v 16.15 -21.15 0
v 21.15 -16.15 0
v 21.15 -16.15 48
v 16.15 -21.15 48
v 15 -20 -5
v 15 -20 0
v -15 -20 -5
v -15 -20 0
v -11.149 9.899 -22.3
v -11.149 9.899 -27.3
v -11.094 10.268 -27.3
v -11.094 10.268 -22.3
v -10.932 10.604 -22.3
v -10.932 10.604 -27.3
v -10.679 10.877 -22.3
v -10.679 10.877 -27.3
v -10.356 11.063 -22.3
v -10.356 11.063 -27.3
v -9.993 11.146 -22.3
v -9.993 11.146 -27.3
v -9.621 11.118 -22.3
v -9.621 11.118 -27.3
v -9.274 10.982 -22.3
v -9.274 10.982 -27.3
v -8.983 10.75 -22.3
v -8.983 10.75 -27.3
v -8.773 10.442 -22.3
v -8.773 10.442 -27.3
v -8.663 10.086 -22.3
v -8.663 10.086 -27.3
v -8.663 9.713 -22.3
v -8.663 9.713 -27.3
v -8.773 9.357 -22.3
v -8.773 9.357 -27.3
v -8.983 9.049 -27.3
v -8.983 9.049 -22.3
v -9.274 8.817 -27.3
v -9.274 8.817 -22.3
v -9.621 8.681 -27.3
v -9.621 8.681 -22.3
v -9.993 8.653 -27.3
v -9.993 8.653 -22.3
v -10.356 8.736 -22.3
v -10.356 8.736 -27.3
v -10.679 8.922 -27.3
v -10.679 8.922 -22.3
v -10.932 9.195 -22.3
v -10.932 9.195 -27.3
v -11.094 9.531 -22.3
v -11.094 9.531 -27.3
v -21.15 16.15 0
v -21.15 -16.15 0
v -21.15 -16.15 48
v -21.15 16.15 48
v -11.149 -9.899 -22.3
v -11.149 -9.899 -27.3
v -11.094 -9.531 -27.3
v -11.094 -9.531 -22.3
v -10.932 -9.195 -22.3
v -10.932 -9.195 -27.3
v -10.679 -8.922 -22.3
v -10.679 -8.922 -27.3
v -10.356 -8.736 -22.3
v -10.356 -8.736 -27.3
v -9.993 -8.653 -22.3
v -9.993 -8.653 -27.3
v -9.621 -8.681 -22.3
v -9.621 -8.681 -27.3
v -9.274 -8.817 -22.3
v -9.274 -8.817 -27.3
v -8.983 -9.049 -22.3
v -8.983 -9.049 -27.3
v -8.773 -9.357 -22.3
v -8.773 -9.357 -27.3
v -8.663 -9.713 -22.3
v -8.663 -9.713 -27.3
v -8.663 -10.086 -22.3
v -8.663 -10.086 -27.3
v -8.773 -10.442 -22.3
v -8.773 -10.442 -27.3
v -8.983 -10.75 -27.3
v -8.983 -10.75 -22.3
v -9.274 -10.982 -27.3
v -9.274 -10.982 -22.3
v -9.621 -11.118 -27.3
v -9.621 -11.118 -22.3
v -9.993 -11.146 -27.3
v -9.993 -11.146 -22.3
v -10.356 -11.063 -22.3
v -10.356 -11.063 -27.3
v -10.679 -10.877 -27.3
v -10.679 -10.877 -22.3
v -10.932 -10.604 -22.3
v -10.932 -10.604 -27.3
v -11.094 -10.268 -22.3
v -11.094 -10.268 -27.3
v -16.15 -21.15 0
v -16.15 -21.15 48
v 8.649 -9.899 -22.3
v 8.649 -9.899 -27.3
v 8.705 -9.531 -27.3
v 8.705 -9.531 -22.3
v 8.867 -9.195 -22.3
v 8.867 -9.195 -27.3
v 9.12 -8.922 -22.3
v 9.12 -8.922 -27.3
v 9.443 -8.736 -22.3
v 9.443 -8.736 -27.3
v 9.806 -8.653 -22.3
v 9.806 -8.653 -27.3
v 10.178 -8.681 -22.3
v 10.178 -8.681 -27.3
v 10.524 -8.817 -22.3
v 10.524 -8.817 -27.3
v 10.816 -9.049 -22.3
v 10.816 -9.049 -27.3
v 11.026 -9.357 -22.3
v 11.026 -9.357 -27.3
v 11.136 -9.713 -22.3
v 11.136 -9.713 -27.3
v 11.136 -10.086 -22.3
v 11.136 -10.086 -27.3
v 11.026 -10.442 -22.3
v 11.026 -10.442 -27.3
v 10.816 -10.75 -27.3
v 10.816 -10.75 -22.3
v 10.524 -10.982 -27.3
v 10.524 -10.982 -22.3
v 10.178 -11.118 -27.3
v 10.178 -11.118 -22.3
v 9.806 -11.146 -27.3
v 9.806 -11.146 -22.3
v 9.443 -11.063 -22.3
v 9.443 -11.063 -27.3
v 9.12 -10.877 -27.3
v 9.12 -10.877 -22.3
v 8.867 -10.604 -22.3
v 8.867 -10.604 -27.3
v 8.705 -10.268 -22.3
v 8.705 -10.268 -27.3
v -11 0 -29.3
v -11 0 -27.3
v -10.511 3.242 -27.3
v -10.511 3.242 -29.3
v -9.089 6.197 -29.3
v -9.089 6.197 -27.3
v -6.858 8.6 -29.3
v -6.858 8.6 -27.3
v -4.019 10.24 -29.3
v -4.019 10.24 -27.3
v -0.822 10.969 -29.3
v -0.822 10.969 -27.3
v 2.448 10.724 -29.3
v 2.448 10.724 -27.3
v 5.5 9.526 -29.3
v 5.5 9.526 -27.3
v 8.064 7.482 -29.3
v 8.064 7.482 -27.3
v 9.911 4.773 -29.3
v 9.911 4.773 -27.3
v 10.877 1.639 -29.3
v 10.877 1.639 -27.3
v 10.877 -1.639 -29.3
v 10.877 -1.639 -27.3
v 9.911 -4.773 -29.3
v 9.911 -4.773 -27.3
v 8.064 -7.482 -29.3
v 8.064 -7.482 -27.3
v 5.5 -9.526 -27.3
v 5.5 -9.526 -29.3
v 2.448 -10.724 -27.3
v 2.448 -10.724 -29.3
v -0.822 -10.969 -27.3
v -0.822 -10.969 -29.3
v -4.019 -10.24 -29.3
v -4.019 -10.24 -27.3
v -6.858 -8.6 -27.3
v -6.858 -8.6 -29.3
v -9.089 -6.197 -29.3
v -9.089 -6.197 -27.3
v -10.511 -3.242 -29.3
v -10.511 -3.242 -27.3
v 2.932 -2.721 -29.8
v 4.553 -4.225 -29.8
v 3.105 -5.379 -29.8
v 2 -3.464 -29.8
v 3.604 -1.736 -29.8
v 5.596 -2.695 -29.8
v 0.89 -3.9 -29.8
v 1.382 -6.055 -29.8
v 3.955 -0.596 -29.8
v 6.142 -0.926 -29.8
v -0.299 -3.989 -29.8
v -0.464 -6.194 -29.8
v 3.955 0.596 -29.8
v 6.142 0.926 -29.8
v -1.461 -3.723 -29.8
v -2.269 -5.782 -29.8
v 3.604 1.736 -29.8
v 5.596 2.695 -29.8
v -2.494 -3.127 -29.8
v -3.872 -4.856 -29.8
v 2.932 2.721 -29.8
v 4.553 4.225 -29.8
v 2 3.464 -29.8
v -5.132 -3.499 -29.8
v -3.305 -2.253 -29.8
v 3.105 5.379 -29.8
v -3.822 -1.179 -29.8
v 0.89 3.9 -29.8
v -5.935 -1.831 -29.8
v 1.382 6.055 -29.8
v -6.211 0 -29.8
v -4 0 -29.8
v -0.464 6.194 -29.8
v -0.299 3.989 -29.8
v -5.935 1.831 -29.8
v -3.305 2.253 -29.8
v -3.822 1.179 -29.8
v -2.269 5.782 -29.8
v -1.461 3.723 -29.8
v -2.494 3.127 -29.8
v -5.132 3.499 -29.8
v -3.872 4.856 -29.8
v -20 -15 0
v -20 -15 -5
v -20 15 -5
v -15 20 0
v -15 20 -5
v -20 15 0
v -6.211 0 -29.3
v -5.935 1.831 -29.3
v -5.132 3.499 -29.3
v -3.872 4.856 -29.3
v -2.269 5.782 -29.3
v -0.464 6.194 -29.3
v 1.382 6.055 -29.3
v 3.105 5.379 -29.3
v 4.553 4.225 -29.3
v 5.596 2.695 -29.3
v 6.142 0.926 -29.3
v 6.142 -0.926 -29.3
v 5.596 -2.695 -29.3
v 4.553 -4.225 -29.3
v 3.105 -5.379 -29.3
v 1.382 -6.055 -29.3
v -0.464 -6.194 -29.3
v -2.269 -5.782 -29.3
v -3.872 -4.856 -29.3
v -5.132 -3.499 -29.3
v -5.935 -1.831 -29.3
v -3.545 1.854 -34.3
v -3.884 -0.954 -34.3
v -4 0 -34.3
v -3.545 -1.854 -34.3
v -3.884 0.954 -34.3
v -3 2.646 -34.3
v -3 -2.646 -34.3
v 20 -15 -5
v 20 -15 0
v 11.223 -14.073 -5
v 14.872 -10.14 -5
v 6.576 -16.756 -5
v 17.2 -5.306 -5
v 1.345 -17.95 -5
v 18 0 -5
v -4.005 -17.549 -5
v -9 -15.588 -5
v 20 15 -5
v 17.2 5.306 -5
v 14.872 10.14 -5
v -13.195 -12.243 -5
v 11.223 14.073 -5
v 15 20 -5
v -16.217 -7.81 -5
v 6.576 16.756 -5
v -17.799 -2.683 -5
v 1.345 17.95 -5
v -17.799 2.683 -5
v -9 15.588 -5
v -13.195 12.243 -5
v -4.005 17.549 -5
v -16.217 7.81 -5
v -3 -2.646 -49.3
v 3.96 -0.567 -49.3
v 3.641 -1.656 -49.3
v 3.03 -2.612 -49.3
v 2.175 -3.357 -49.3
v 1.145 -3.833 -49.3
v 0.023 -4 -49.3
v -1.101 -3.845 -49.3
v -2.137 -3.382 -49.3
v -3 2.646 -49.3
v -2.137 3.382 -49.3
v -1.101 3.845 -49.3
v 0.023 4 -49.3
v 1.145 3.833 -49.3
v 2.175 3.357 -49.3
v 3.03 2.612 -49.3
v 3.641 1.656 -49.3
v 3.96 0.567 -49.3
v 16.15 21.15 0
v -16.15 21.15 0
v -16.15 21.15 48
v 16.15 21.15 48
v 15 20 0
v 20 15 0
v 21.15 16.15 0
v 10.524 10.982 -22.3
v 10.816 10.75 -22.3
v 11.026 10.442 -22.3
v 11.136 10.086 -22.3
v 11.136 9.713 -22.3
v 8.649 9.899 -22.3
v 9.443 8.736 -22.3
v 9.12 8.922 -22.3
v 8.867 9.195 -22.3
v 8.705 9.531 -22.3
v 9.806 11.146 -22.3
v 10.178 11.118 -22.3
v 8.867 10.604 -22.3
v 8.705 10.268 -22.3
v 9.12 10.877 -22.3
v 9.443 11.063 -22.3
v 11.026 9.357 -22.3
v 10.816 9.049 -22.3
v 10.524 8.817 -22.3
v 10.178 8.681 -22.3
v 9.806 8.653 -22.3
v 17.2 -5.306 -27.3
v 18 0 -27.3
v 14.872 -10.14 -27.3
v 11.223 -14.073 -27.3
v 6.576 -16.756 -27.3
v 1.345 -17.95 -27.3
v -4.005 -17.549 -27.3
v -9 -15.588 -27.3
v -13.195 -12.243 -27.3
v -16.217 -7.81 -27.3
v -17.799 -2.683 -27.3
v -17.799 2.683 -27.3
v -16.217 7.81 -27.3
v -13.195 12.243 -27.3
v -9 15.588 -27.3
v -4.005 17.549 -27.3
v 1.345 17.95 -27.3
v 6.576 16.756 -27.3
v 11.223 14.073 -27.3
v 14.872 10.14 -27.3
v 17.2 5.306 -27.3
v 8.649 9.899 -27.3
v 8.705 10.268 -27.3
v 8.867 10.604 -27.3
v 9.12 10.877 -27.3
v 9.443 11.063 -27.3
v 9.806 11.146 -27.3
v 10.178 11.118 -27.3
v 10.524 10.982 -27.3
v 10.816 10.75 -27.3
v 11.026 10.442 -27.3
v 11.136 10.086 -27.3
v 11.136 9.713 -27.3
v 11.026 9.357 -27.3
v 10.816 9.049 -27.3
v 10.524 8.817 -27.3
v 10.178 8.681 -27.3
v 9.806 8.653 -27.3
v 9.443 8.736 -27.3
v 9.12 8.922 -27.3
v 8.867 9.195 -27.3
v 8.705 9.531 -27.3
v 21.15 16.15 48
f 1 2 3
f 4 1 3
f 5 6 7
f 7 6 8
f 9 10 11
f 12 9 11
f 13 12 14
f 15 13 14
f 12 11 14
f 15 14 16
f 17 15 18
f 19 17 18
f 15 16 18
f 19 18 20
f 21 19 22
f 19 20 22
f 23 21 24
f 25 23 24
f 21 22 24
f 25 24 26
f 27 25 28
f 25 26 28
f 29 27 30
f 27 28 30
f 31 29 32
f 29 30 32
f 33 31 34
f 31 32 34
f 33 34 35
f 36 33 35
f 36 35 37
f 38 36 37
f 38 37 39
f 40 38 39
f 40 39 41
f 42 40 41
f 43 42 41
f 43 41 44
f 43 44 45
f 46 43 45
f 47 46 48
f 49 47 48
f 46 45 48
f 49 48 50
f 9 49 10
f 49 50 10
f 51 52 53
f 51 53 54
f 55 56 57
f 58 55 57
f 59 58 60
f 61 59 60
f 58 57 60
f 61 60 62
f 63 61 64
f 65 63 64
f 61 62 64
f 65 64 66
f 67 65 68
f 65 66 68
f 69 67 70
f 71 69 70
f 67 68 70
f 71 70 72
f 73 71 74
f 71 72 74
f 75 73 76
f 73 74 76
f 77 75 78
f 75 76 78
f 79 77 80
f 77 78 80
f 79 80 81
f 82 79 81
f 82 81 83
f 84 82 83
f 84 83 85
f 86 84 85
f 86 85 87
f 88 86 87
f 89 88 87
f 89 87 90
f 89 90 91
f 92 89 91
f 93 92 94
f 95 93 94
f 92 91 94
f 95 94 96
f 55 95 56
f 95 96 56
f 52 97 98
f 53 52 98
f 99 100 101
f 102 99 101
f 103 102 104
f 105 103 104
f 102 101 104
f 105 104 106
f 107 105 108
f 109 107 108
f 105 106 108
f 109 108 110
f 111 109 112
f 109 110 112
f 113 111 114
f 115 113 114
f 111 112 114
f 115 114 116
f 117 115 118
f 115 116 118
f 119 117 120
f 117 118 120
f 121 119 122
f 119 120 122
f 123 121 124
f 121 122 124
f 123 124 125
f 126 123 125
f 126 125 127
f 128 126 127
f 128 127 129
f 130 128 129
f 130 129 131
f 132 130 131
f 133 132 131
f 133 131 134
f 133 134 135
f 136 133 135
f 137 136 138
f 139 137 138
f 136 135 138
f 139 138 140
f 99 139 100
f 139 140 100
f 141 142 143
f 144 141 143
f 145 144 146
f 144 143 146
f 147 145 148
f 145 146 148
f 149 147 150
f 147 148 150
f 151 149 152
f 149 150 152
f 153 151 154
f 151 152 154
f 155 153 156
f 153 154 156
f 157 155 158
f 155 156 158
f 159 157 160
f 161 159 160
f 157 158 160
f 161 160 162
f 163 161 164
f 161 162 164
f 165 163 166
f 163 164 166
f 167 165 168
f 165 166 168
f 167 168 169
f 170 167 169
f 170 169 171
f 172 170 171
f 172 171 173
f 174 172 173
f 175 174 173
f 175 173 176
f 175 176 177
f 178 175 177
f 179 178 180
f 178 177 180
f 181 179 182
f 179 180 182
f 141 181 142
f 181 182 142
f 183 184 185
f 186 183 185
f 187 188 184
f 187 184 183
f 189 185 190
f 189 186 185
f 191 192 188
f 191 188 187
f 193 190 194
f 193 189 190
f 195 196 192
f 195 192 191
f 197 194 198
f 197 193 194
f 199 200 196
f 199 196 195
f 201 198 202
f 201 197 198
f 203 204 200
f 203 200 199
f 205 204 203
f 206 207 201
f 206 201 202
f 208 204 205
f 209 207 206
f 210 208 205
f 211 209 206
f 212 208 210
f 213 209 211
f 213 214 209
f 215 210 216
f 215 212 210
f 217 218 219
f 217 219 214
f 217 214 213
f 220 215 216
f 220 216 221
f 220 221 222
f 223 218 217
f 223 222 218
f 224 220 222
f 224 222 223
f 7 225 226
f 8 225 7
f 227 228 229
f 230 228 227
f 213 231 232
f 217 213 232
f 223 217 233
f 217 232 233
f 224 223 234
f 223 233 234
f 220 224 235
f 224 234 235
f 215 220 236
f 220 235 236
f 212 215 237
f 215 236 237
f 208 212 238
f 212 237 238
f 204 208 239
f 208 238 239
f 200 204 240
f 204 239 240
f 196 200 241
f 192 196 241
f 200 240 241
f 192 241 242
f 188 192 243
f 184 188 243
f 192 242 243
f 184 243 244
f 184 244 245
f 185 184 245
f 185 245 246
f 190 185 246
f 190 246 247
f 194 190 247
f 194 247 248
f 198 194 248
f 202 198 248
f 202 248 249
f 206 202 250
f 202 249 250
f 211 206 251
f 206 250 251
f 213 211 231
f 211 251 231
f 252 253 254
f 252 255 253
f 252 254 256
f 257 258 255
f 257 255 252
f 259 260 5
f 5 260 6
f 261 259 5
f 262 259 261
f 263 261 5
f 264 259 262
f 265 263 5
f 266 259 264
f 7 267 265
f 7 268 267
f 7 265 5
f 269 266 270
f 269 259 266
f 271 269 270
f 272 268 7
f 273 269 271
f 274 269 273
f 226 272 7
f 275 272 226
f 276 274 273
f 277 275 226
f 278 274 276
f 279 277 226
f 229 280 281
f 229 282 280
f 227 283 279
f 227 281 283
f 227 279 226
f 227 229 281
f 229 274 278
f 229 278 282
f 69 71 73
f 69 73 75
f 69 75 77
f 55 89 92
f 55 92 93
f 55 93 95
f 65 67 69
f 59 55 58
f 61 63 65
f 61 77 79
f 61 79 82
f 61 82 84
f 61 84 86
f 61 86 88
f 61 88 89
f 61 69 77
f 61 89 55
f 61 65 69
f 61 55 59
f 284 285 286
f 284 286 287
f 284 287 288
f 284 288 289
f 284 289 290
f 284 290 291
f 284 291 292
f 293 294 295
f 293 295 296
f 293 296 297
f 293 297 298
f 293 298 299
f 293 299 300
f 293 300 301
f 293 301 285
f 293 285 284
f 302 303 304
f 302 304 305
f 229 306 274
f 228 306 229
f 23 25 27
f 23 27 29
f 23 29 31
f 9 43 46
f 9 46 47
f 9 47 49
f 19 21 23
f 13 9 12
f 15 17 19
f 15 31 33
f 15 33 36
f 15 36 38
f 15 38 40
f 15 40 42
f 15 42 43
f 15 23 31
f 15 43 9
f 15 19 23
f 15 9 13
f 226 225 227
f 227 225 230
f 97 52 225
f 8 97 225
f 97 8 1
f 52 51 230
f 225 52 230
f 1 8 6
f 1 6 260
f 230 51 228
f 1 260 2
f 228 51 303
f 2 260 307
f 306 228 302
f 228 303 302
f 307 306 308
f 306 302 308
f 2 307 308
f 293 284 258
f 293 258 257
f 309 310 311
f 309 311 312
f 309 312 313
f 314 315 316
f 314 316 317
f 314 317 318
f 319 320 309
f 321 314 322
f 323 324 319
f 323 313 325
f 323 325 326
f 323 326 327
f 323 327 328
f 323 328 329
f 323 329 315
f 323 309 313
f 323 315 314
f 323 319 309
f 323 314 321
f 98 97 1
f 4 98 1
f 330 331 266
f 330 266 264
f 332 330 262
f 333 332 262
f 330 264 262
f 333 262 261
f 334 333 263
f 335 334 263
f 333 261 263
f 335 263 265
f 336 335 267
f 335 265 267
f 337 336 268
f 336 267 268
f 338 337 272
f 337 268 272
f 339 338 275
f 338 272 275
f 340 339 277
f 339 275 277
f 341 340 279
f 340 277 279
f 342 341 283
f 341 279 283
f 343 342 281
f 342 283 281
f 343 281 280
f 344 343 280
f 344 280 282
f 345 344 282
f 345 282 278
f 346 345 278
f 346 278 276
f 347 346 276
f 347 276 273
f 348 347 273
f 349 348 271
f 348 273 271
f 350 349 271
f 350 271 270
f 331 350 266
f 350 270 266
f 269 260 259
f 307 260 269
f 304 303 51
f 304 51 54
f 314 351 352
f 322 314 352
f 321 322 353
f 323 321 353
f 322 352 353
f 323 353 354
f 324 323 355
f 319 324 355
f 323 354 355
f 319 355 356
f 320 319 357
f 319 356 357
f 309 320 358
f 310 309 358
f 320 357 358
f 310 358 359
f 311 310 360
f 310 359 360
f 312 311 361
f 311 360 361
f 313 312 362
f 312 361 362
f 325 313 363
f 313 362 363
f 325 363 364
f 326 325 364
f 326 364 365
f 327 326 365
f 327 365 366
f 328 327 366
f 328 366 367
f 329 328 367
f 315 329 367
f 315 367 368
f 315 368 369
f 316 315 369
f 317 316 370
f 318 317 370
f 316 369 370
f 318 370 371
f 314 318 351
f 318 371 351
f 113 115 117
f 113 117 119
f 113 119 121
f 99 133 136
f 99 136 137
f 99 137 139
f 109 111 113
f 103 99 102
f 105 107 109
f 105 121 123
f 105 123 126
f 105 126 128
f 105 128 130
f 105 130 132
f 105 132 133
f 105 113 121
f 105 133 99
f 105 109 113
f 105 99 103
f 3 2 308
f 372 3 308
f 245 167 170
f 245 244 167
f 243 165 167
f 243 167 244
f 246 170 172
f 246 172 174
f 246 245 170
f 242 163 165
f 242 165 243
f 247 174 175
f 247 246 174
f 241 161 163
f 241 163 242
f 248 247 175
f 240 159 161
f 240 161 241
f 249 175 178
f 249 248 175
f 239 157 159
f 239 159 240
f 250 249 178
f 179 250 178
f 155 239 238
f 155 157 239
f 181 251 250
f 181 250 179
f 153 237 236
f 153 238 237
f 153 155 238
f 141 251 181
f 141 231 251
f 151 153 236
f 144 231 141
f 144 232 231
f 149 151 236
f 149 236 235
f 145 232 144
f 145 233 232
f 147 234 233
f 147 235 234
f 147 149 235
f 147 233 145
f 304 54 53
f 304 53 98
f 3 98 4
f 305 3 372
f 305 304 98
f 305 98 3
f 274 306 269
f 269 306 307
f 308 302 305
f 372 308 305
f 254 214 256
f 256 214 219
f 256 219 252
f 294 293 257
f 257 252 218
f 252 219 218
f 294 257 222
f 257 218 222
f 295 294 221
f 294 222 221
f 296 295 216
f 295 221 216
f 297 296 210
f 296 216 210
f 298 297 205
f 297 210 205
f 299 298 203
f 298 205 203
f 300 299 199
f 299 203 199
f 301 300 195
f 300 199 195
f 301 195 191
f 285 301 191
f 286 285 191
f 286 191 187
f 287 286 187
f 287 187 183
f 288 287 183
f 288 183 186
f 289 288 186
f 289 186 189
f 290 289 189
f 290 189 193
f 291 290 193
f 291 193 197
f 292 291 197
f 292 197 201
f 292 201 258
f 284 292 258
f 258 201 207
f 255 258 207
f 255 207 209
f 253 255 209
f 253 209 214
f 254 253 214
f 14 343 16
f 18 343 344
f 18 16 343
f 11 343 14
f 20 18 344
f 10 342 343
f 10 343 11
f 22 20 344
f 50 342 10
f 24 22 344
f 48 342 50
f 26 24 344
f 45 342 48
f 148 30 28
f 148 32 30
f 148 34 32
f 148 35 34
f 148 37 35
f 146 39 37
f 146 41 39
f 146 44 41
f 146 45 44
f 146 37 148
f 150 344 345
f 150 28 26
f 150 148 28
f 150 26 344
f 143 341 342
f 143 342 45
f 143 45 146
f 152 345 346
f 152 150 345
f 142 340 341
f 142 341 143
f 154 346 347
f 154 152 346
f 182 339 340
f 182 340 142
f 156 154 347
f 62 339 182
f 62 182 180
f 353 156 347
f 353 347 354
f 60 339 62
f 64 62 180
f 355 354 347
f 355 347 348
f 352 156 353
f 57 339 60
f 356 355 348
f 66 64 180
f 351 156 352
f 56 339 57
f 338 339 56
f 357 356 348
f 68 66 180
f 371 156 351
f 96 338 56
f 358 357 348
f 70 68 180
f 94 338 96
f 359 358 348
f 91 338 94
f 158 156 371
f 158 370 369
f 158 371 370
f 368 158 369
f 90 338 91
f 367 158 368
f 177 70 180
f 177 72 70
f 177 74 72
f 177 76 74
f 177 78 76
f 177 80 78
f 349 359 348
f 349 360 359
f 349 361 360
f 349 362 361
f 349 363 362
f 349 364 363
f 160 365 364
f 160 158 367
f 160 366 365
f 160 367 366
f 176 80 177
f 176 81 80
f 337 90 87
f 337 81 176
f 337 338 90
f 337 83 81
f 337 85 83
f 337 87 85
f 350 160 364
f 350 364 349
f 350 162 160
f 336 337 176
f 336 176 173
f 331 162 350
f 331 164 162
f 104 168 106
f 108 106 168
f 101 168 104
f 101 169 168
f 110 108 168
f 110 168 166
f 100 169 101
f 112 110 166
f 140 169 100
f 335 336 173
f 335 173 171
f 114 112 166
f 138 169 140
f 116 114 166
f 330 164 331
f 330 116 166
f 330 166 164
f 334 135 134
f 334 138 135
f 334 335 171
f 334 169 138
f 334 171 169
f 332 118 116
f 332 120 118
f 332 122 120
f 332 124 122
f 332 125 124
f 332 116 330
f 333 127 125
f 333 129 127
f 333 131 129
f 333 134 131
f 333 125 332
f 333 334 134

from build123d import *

# Parameters (mm, degrees)
SKETCH1_W           = 42.3
SKETCH1_H           = 42.3
BOSS_EXTRUDE1_DEPTH = 48
CHAMFER1_SIZE       = 5
SKETCH2_W           = 40
SKETCH2_H           = 40
BOSS_EXTRUDE2_DEPTH = 5
CHAMFER2_SIZE       = 5
SKETCH3_R           = 18
BOSS_EXTRUDE3_DEPTH = 22.3
SKETCH4_R           = 11
BOSS_EXTRUDE4_DEPTH = 2
SKETCH5_R           = 4
BOSS_EXTRUDE5_DEPTH = 20
SKETCH6_R           = 6.210975092
BOSS_EXTRUDE6_DEPTH = 0.5
SKETCH7_R           = 1.25
CUT_EXTRUDE1_DEPTH  = 5
SKETCH8_W           = 4.27994847
SKETCH8_H           = 8.688986299
CUT_EXTRUDE2_DEPTH  = 15


with BuildPart() as part:
    # Sketch1 → Boss-Extrude1 (new body)
    with BuildSketch(Plane.XY):
        Rectangle(SKETCH1_W, SKETCH1_H)
    extrude(amount=BOSS_EXTRUDE1_DEPTH)

    # Chamfer1
    chamfer1_edges = [part.edges().sort_by_distance(p)[0] for p in [
        (21.15, -21.15, 24),
        (-21.15, -21.15, 24),
        (-21.15, 21.15, 24),
        (21.15, 21.15, 24),
    ]]
    chamfer(chamfer1_edges, length=CHAMFER1_SIZE)

    # Sketch2 → Boss-Extrude2 (add)
    with BuildSketch(Plane(origin=(0, 0, 0), x_dir=(-1, 0, 0), z_dir=(0, 0, -1))):
        Rectangle(SKETCH2_W, SKETCH2_H)
    extrude(amount=BOSS_EXTRUDE2_DEPTH)

    # Chamfer2
    # the kernel refuses this chamfer: 5 mm, written as the material it takes off along each edge
    with BuildSketch(Plane(origin=(-20, -20, 0), x_dir=(-0.027495876610586317, 0.9996219169112968, 0), z_dir=(0, 0, -1)), Plane(origin=(-20, 20, 0), x_dir=(0.9996219169112968, 0.027495876610586317, 0), z_dir=(0, 0, -1))) as chamfer2_piece_1:
        Polygon((CHAMFER2_SIZE * 0.999621916911, CHAMFER2_SIZE * 0.0274958766106), (-CHAMFER2_SIZE * 0.0274958766106, CHAMFER2_SIZE * 0.999621916911), (0, 0), align=None)
    extrude(amount=17.85841494, mode=Mode.SUBTRACT)
    with BuildSketch(Plane(origin=(20, 20, 0), x_dir=(-0.9996219169112968, 0.027495876610586317, 0), z_dir=(0, 0, -1)), Plane(origin=(20, -20, 0), x_dir=(0.027495876610586317, 0.9996219169112968, 0), z_dir=(0, 0, -1))) as chamfer2_piece_2:
        Polygon((CHAMFER2_SIZE * 0.999621916911, -CHAMFER2_SIZE * 0.0274958766106), (-CHAMFER2_SIZE * 0.0274958766106, -CHAMFER2_SIZE * 0.999621916911), (0, 0), align=None)
    extrude(amount=17.85841494, mode=Mode.SUBTRACT)

    # Sketch3 → Boss-Extrude3 (add)
    with BuildSketch(Plane(origin=(0, 0, -5), x_dir=(-1, 0, 0), z_dir=(0, 0, -1))):
        with Locations(Location((0, 0, 0), (0, 0, 180))):
            Circle(SKETCH3_R)
    extrude(amount=BOSS_EXTRUDE3_DEPTH)

    # Sketch4 → Boss-Extrude4 (add)
    with BuildSketch(Plane(origin=(0, 0, -27.3), x_dir=(-1, 0, 0), z_dir=(0, 0, -1))):
        Circle(SKETCH4_R)
    extrude(amount=BOSS_EXTRUDE4_DEPTH)

    # Sketch5 → Boss-Extrude5 (add)
    with BuildSketch(Plane(origin=(0, 0, -29.3), x_dir=(-1, 0, 0), z_dir=(0, 0, -1))):
        Circle(SKETCH5_R)
    extrude(amount=BOSS_EXTRUDE5_DEPTH)

    # Sketch6 → Boss-Extrude6 (add)
    with BuildSketch(Plane(origin=(0, 0, -29.3), x_dir=(-1, 0, 0), z_dir=(0, 0, -1))):
        Circle(SKETCH6_R)
    extrude(amount=BOSS_EXTRUDE6_DEPTH)

    # Sketch7 → Cut-Extrude1 (cut)
    with BuildSketch(Plane(origin=(0, 0, -27.3), x_dir=(-1, 0, 0), z_dir=(0, 0, -1))):
        with Locations((9.899494937, 9.899494937)):
            Circle(SKETCH7_R)
        with Locations((9.899494937, -9.899494937)):
            Circle(SKETCH7_R)
        with Locations((-9.899494937, -9.899494937)):
            Circle(SKETCH7_R)
        with Locations((-9.899494937, 9.899494937)):
            Circle(SKETCH7_R)
    extrude(amount=-CUT_EXTRUDE1_DEPTH, mode=Mode.SUBTRACT)

    # Sketch8 → Cut-Extrude2 (cut)
    with BuildSketch(Plane(origin=(0, 0, -49.3), x_dir=(-1, 0, 0), z_dir=(0, 0, -1))):
        with Locations((5.139974235, -0.230171823)):
            Rectangle(SKETCH8_W, SKETCH8_H)
    extrude(amount=-CUT_EXTRUDE2_DEPTH, mode=Mode.SUBTRACT)


solid = part.part
